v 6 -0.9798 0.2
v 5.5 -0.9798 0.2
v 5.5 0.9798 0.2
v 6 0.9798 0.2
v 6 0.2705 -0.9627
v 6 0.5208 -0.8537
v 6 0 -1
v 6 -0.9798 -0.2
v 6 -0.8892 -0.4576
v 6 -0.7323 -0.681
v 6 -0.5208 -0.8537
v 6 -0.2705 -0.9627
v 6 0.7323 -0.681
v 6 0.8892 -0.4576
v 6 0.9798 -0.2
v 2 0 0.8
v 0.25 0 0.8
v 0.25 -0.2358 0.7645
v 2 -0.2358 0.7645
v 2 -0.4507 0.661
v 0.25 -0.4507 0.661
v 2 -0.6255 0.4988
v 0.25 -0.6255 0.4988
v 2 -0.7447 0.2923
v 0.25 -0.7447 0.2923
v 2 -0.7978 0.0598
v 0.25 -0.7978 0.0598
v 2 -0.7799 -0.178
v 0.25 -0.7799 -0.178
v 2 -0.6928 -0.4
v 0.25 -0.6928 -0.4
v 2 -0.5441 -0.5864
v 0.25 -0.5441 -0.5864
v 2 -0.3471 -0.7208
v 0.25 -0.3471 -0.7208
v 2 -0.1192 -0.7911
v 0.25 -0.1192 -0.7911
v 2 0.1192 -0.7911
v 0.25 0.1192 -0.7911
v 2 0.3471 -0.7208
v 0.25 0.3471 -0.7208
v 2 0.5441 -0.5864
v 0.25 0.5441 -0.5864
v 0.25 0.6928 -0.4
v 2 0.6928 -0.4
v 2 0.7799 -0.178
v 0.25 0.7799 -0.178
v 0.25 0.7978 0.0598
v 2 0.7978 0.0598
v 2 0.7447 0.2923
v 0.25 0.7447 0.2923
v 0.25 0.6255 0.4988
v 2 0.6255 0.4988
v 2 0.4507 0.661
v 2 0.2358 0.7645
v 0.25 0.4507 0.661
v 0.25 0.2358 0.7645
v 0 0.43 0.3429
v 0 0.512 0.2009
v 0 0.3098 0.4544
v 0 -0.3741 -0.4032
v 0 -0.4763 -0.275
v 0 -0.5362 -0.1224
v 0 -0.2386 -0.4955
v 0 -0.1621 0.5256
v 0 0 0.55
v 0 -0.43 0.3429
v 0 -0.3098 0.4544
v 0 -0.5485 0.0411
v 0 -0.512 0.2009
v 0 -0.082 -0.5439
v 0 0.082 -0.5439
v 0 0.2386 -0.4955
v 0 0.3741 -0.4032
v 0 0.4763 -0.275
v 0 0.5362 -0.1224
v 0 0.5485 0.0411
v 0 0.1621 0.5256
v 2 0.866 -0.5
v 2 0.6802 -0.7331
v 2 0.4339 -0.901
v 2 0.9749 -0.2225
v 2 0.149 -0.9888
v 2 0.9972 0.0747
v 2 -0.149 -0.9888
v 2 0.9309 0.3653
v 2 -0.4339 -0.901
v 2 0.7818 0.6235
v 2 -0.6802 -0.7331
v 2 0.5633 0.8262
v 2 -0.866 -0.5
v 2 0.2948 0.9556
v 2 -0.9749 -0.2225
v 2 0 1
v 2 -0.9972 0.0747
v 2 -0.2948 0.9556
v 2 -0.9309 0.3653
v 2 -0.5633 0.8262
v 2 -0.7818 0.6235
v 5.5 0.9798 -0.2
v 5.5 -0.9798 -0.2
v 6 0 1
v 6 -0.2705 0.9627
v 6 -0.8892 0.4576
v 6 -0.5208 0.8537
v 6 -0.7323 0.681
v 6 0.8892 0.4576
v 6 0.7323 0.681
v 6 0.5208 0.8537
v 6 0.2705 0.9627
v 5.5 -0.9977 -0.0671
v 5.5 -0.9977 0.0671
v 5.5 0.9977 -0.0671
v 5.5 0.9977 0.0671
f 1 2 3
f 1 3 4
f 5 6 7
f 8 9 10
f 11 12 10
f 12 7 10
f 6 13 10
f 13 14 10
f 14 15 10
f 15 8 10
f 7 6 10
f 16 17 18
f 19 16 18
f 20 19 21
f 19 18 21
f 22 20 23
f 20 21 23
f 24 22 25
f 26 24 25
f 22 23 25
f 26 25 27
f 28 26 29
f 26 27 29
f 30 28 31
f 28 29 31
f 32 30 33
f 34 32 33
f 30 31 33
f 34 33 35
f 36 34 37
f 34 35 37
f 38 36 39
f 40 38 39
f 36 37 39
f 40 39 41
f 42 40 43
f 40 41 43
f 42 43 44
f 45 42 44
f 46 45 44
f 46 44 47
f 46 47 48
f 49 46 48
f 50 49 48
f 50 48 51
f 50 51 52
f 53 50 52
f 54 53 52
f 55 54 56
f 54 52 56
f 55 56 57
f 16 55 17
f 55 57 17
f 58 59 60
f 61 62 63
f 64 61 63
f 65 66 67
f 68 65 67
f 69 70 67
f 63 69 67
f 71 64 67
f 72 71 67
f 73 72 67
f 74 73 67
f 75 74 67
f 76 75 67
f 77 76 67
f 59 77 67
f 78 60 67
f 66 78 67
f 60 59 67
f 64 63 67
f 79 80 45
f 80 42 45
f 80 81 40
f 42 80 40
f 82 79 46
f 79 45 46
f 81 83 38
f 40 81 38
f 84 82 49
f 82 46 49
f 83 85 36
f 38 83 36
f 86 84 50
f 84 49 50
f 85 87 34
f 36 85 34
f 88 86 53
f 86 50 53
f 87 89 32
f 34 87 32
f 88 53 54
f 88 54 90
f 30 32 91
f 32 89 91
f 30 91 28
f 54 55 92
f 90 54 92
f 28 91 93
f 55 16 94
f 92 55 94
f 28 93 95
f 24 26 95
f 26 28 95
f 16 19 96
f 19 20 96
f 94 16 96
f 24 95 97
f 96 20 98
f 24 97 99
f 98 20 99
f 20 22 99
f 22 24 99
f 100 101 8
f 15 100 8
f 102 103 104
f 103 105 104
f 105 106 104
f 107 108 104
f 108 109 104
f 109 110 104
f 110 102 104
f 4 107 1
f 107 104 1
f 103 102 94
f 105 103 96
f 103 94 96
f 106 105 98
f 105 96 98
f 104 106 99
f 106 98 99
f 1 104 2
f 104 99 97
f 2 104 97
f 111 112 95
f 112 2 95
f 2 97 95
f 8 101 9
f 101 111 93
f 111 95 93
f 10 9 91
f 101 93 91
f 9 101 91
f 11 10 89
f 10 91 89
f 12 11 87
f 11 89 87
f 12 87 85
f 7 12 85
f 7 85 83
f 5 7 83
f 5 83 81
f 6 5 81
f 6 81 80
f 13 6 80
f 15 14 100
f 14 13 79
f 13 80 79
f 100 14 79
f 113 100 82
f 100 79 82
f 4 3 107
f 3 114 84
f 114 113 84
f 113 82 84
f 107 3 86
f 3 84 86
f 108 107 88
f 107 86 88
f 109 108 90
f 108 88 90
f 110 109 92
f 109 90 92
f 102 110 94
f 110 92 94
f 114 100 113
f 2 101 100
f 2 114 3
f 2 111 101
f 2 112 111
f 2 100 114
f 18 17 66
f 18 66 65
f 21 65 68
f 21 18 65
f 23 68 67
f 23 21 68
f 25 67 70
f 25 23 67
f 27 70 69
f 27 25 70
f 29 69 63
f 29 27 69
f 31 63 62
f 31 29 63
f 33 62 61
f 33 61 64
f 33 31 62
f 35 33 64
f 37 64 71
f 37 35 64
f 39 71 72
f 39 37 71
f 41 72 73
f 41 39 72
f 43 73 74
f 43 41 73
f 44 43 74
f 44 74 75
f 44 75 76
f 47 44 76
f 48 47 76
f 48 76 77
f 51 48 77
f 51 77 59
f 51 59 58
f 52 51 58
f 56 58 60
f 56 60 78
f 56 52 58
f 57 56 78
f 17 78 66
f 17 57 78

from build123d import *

# Parameters (mm, degrees)
F2_SIZE  = 0.25
F3_W     = 1.5
F3_H     = 0.4
F4_DEPTH = 12.5


with BuildPart() as f1:
    # F0 (on Front) → F1 (revolve)
    with BuildSketch(Plane.XZ):
        Polygon((0, 0.8), (0, 0), (6, 0), (6, 1), (2, 1), (2, 0.8), align=None)
    revolve(axis=Axis((3, 0, 0), (1, 0, 0)))

    # F2
    f2_edges = [f1.edges().sort_by_distance(p)[0] for p in [
        (0, 0, -0.8),
    ]]
    chamfer(f2_edges, length=F2_SIZE)

    # F3 (on Front) → F4 (cut, symmetric)
    with BuildSketch(Plane.XZ):
        with Locations((6.25, 0)):
            Rectangle(F3_W, F3_H)
    extrude(amount=F4_DEPTH, both=True, mode=Mode.SUBTRACT)


solid = f1.part
